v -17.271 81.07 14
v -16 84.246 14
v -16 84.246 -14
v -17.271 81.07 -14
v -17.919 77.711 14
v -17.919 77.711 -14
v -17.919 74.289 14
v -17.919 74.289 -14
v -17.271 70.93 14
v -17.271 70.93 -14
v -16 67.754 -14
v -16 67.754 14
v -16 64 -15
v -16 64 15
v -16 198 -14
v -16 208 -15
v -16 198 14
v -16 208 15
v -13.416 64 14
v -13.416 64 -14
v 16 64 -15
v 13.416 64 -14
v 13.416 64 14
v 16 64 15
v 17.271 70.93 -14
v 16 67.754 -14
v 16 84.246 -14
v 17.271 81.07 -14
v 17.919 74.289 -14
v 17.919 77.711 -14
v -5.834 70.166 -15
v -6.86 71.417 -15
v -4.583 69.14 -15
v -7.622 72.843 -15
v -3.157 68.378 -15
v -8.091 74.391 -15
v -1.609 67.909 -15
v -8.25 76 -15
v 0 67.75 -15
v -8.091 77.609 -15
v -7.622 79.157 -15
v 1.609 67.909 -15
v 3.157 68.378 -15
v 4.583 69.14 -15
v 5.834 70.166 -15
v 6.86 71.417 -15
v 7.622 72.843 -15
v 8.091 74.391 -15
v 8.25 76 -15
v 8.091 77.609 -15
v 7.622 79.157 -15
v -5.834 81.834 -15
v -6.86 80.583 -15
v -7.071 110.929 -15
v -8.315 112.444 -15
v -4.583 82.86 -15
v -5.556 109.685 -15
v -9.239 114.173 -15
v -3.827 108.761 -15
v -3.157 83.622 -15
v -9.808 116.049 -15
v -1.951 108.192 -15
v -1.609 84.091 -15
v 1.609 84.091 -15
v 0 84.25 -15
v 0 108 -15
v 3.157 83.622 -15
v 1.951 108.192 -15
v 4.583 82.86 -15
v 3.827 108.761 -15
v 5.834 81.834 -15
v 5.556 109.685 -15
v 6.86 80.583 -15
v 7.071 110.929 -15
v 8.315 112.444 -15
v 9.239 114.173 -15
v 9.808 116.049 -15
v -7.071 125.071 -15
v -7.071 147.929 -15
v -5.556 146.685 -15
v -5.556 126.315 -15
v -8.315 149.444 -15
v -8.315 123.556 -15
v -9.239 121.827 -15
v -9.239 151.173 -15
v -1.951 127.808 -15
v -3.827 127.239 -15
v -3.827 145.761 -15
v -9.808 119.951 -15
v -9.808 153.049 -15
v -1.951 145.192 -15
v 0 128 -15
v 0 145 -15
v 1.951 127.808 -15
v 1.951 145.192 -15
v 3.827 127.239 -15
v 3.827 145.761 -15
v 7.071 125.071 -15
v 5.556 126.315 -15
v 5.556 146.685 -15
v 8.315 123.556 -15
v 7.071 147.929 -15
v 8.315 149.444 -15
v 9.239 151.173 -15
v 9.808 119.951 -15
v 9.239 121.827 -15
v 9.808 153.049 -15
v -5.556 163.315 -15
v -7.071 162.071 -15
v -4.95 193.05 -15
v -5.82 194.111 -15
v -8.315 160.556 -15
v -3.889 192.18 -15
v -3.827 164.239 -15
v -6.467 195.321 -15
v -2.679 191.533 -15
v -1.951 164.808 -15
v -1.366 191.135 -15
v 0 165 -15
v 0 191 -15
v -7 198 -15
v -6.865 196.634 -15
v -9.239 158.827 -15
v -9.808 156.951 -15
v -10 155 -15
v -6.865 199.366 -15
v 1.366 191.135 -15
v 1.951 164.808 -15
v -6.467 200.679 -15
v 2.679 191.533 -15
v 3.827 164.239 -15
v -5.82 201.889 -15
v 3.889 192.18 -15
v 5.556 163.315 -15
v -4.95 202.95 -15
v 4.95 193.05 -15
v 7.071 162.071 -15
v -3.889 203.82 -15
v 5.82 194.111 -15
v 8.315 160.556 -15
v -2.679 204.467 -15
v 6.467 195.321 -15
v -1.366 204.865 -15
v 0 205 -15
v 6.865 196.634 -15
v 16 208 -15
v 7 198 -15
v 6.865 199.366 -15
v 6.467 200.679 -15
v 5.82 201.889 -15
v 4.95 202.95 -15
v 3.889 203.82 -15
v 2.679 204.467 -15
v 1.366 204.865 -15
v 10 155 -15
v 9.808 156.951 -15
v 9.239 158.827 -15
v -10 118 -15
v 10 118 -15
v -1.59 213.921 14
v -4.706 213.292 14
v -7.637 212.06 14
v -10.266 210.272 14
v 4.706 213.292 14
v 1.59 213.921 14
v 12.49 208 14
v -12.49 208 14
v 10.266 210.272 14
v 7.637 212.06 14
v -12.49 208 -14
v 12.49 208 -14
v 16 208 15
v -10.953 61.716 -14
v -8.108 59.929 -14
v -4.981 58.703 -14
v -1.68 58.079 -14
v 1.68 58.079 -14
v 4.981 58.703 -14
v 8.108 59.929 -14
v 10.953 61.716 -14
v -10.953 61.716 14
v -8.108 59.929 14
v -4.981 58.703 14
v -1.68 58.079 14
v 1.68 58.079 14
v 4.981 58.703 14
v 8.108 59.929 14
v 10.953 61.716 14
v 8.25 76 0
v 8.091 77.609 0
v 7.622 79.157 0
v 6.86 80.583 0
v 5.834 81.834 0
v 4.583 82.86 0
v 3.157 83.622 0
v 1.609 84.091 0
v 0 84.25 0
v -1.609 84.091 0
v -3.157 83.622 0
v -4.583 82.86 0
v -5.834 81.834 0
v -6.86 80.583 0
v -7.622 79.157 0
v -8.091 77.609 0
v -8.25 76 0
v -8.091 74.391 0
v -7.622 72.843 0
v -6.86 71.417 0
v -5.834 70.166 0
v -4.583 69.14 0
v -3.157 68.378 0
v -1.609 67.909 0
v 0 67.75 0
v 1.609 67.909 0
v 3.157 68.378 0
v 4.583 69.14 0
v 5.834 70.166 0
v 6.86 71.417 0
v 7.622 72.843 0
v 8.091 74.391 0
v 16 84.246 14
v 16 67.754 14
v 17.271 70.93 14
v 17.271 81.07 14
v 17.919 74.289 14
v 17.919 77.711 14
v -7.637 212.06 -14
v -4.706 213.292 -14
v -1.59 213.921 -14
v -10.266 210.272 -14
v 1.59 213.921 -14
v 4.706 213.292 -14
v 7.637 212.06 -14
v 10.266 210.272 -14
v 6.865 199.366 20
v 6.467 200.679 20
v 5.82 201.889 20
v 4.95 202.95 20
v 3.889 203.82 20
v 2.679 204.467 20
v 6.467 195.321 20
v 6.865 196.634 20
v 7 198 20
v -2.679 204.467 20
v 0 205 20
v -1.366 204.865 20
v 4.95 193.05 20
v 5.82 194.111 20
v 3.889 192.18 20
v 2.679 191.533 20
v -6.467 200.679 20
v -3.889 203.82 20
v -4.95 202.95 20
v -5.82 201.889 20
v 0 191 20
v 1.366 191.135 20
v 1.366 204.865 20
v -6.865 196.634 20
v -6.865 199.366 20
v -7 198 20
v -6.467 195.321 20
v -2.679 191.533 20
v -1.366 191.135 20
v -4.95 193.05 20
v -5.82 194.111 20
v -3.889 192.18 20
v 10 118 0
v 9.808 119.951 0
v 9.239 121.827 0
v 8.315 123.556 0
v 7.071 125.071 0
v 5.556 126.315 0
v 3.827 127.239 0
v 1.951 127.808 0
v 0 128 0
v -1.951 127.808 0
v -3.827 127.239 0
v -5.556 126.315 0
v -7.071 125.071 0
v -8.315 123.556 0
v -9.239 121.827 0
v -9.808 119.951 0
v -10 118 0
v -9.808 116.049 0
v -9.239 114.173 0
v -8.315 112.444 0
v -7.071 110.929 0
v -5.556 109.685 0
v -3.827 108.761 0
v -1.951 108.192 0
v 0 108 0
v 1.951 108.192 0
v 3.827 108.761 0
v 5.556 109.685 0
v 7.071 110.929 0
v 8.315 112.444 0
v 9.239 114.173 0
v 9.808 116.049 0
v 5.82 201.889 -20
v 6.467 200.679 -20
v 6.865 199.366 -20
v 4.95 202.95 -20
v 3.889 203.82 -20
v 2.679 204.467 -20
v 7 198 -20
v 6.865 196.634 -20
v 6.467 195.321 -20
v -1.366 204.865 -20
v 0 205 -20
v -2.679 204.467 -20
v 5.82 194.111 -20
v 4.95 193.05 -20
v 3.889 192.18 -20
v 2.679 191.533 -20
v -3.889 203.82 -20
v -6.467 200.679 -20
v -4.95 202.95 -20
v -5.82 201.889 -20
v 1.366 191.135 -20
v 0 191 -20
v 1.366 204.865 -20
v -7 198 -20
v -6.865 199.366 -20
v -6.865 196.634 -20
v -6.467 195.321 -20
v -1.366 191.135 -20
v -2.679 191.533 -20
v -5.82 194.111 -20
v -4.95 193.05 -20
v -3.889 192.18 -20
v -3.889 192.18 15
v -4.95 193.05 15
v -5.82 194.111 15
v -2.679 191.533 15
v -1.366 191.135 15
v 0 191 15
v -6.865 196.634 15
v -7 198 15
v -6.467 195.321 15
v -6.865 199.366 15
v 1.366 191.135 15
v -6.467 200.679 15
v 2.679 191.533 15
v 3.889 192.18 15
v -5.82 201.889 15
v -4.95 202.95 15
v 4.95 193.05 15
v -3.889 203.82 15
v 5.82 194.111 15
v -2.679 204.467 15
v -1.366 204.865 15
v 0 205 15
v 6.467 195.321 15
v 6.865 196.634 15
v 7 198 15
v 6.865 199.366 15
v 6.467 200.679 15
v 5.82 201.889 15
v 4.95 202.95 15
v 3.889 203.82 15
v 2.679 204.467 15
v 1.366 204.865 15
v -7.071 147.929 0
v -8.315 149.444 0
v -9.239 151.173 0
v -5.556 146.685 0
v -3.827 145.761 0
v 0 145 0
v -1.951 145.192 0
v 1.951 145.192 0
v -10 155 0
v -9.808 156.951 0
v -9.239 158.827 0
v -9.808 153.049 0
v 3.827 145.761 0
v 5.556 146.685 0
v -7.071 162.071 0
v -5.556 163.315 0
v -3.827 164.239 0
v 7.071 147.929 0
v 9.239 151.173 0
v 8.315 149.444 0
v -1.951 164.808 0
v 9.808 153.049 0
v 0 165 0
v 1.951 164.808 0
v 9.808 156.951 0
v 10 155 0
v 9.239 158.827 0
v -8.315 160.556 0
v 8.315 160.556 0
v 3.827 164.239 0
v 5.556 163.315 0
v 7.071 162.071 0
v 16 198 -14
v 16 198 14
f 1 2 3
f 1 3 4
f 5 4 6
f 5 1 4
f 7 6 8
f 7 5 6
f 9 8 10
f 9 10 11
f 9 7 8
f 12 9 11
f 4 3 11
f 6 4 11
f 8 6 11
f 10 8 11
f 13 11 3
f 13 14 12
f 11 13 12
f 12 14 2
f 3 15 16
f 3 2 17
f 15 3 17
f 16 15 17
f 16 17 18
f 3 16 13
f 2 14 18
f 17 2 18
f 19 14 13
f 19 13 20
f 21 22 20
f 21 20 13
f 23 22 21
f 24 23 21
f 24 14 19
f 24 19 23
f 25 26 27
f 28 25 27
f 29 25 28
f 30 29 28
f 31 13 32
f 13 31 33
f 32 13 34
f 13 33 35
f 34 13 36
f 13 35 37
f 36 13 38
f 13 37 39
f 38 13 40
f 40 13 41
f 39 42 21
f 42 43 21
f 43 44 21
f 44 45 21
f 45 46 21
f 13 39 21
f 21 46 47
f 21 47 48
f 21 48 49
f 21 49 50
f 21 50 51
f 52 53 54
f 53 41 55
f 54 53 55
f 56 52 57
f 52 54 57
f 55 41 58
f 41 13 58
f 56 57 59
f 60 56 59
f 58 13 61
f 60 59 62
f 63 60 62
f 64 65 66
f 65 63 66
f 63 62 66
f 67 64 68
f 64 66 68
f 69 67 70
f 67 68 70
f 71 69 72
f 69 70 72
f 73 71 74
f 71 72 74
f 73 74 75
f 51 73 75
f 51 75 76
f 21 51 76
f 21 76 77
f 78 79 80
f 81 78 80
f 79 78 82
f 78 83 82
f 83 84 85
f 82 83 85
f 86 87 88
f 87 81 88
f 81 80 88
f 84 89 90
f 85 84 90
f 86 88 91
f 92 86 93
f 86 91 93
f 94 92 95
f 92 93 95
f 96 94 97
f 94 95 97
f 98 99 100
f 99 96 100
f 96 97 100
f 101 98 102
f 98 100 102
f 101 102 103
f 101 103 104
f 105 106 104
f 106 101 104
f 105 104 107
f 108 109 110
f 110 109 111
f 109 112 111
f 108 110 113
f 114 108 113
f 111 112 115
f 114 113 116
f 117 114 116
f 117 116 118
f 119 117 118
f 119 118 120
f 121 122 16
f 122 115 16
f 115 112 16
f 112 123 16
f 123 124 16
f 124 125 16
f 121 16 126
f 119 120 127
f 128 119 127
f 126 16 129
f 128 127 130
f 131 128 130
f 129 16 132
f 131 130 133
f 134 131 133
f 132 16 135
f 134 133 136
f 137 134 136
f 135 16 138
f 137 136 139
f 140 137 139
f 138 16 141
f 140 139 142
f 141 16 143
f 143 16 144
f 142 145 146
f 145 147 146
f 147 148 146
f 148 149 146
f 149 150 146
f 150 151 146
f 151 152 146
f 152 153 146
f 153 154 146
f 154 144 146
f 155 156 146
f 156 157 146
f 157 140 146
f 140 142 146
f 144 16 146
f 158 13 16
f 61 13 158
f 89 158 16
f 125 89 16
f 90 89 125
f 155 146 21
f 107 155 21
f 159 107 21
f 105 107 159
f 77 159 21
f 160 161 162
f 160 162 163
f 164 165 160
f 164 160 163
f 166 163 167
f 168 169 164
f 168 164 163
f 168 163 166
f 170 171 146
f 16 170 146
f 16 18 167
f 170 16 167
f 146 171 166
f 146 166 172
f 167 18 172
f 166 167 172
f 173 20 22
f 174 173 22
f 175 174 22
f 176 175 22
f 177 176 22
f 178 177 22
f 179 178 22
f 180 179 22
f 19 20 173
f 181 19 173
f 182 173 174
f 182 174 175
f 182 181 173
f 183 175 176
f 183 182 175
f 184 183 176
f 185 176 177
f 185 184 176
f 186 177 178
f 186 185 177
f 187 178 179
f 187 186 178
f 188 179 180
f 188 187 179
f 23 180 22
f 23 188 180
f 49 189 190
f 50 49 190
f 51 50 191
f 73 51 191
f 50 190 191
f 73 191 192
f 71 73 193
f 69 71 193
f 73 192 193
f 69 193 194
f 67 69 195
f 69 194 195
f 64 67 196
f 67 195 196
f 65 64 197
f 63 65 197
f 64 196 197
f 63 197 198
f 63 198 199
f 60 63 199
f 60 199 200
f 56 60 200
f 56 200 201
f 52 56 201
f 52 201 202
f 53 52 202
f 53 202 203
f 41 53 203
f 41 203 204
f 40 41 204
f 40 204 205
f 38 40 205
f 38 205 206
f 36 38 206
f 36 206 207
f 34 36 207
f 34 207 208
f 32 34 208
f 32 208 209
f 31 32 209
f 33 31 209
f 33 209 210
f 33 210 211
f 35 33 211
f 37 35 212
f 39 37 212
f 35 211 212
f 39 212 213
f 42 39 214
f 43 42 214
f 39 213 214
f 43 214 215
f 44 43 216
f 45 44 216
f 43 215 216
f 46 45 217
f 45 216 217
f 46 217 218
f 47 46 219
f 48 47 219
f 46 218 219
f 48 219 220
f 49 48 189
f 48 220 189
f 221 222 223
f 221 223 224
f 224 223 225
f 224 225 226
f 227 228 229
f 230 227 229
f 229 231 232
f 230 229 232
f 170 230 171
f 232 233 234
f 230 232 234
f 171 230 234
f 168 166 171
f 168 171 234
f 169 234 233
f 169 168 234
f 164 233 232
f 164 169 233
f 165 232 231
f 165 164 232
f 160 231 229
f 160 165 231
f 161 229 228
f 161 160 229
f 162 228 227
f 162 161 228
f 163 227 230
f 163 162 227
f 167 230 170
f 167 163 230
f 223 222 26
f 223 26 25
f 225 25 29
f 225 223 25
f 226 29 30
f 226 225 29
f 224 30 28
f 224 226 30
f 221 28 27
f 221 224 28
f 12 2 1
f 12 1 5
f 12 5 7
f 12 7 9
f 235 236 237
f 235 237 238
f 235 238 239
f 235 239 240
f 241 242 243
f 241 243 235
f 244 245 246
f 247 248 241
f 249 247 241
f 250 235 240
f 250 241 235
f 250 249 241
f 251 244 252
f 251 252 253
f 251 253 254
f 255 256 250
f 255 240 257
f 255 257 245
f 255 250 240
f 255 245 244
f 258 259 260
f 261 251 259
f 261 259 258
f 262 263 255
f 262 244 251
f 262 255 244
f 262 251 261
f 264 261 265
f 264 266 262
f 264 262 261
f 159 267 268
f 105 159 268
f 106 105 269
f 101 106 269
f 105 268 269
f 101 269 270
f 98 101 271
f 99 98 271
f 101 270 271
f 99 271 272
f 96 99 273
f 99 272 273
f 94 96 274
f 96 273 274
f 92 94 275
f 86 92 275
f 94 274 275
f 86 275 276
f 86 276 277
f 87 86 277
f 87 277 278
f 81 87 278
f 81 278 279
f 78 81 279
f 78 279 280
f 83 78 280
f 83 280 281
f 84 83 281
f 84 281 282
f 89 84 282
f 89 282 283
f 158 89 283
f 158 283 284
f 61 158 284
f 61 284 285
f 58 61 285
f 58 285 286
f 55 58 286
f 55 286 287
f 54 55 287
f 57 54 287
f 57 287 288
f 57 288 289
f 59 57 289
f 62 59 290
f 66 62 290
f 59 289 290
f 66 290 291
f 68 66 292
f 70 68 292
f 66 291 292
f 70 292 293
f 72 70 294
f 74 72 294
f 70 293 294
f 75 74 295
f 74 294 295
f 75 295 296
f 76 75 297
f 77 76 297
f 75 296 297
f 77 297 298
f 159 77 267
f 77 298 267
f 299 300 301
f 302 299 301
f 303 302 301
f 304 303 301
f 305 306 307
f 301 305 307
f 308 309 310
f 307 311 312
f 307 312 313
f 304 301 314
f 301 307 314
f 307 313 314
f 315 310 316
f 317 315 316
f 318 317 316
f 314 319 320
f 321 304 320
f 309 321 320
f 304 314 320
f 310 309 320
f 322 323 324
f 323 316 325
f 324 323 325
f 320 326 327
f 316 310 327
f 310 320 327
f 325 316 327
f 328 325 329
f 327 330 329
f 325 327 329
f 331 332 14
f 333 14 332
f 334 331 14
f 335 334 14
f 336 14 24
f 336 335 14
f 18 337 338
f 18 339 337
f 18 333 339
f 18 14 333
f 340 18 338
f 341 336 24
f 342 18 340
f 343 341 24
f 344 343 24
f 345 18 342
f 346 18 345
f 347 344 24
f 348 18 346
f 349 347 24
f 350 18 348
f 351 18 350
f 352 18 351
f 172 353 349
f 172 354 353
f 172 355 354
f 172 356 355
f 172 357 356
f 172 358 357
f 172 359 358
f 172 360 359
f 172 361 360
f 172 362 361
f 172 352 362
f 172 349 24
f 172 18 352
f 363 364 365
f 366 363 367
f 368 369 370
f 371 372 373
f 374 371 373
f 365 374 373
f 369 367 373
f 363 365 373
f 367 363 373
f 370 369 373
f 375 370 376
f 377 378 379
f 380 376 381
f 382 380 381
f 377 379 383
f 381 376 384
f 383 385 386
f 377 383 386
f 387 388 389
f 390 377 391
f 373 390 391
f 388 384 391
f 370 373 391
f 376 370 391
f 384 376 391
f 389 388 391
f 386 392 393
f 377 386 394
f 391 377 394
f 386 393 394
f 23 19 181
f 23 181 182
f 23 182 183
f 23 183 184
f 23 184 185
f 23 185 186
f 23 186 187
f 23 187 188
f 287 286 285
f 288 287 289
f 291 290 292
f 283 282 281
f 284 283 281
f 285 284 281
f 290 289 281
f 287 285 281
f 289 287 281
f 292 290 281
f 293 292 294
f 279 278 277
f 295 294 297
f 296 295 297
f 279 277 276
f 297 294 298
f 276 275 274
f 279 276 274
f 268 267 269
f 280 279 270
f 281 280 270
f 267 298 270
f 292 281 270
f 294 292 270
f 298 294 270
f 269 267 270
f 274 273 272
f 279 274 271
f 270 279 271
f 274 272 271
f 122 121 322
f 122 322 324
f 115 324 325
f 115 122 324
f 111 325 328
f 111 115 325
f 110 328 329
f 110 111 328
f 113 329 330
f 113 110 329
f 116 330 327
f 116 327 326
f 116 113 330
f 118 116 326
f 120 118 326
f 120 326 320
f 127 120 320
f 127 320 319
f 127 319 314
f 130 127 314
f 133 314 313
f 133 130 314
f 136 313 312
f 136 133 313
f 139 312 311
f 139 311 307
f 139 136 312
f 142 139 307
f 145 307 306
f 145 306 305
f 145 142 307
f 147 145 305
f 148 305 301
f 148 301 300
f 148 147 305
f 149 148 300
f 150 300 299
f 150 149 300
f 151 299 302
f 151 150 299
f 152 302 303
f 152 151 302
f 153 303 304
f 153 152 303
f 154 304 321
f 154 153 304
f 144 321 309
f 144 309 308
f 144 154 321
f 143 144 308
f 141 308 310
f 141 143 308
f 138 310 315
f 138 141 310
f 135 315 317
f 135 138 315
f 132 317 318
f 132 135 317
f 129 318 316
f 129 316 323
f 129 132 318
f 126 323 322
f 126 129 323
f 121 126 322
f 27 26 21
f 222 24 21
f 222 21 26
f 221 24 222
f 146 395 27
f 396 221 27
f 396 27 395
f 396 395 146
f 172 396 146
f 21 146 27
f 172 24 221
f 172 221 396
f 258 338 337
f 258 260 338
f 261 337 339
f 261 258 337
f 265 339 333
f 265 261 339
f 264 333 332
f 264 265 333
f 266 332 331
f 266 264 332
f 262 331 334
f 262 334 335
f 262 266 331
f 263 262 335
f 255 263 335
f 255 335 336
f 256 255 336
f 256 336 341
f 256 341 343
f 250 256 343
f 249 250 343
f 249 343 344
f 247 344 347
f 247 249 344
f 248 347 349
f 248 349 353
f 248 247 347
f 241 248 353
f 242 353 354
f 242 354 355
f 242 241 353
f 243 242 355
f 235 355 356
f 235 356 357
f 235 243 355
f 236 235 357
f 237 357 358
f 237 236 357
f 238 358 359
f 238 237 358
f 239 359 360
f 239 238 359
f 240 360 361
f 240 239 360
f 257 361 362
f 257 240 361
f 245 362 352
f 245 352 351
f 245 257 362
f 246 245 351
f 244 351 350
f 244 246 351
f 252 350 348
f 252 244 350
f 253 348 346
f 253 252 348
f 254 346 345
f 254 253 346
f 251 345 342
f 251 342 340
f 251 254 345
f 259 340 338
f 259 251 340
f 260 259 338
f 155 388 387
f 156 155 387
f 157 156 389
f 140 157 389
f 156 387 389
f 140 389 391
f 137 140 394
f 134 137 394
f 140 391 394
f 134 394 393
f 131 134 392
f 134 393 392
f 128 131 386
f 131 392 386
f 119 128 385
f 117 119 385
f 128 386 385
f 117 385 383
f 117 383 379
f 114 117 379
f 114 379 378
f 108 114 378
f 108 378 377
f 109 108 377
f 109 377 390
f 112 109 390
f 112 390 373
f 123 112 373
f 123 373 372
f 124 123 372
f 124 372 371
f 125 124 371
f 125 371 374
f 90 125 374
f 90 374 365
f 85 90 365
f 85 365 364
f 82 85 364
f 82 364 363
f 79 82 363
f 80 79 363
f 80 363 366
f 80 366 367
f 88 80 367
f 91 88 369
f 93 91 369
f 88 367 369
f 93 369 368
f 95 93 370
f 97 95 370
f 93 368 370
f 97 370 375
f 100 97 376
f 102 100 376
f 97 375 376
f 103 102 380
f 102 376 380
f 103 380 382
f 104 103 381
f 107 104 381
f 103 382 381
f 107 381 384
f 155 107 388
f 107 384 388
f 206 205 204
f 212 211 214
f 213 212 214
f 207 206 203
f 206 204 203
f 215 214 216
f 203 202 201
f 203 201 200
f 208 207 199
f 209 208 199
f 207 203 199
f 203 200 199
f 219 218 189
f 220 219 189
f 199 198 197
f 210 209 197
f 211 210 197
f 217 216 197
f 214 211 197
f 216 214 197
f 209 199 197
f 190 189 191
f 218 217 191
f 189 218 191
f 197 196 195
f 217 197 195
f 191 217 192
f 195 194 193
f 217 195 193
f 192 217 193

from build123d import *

# Parameters (mm, degrees)
SKETCH1_W           = 32
SKETCH1_H           = 144
BOSS_EXTRUDE1_DEPTH = 15
SKETCH2_R           = 18
BOSS_EXTRUDE2_DEPTH = 14
SKETCH3_R           = 16
BOSS_EXTRUDE3_DEPTH = 14
SKETCH4_R           = 8.25
CUT_EXTRUDE1_DEPTH  = 216.278888886
SKETCH5_R           = 7
BOSS_EXTRUDE4_DEPTH = 20
SKETCH6_R           = 10
CUT_EXTRUDE2_DEPTH  = 216.684955433


with BuildPart() as part:
    # Sketch1 → Boss-Extrude1 (new, symmetric)
    with BuildSketch(Plane.XY):
        with Locations((0, 136)):
            Rectangle(SKETCH1_W, SKETCH1_H)
    extrude(amount=BOSS_EXTRUDE1_DEPTH, both=True)

    # Sketch2 → Boss-Extrude2 (add, symmetric)
    with BuildSketch(Plane.XY):
        with Locations((0, 76)):
            Circle(SKETCH2_R)
    extrude(amount=BOSS_EXTRUDE2_DEPTH, both=True)

    # Sketch3 → Boss-Extrude3 (add, symmetric)
    with BuildSketch(Plane.XY):
        with Locations((0, 198)):
            Circle(SKETCH3_R)
    extrude(amount=BOSS_EXTRUDE3_DEPTH, both=True)

    # Sketch4 → Cut-Extrude1 (cut, through all)
    with BuildSketch(Plane.XY):
        with Locations((0, 76)):
            Circle(SKETCH4_R)
    extrude(amount=-CUT_EXTRUDE1_DEPTH, mode=Mode.SUBTRACT)

    # Sketch5 → Boss-Extrude4 (add, symmetric)
    with BuildSketch(Plane.XY):
        with Locations(Location((0, 198, 0), (0, 0, 180))):
            Circle(SKETCH5_R)
    extrude(amount=BOSS_EXTRUDE4_DEPTH, both=True)

    # Sketch6 → Cut-Extrude2 (cut, through all)
    with BuildSketch(Plane.XY):
        with Locations((0, 118)):
            Circle(SKETCH6_R)
        with Locations((0, 155)):
            Circle(SKETCH6_R)
    extrude(amount=-CUT_EXTRUDE2_DEPTH, mode=Mode.SUBTRACT)


solid = part.part
